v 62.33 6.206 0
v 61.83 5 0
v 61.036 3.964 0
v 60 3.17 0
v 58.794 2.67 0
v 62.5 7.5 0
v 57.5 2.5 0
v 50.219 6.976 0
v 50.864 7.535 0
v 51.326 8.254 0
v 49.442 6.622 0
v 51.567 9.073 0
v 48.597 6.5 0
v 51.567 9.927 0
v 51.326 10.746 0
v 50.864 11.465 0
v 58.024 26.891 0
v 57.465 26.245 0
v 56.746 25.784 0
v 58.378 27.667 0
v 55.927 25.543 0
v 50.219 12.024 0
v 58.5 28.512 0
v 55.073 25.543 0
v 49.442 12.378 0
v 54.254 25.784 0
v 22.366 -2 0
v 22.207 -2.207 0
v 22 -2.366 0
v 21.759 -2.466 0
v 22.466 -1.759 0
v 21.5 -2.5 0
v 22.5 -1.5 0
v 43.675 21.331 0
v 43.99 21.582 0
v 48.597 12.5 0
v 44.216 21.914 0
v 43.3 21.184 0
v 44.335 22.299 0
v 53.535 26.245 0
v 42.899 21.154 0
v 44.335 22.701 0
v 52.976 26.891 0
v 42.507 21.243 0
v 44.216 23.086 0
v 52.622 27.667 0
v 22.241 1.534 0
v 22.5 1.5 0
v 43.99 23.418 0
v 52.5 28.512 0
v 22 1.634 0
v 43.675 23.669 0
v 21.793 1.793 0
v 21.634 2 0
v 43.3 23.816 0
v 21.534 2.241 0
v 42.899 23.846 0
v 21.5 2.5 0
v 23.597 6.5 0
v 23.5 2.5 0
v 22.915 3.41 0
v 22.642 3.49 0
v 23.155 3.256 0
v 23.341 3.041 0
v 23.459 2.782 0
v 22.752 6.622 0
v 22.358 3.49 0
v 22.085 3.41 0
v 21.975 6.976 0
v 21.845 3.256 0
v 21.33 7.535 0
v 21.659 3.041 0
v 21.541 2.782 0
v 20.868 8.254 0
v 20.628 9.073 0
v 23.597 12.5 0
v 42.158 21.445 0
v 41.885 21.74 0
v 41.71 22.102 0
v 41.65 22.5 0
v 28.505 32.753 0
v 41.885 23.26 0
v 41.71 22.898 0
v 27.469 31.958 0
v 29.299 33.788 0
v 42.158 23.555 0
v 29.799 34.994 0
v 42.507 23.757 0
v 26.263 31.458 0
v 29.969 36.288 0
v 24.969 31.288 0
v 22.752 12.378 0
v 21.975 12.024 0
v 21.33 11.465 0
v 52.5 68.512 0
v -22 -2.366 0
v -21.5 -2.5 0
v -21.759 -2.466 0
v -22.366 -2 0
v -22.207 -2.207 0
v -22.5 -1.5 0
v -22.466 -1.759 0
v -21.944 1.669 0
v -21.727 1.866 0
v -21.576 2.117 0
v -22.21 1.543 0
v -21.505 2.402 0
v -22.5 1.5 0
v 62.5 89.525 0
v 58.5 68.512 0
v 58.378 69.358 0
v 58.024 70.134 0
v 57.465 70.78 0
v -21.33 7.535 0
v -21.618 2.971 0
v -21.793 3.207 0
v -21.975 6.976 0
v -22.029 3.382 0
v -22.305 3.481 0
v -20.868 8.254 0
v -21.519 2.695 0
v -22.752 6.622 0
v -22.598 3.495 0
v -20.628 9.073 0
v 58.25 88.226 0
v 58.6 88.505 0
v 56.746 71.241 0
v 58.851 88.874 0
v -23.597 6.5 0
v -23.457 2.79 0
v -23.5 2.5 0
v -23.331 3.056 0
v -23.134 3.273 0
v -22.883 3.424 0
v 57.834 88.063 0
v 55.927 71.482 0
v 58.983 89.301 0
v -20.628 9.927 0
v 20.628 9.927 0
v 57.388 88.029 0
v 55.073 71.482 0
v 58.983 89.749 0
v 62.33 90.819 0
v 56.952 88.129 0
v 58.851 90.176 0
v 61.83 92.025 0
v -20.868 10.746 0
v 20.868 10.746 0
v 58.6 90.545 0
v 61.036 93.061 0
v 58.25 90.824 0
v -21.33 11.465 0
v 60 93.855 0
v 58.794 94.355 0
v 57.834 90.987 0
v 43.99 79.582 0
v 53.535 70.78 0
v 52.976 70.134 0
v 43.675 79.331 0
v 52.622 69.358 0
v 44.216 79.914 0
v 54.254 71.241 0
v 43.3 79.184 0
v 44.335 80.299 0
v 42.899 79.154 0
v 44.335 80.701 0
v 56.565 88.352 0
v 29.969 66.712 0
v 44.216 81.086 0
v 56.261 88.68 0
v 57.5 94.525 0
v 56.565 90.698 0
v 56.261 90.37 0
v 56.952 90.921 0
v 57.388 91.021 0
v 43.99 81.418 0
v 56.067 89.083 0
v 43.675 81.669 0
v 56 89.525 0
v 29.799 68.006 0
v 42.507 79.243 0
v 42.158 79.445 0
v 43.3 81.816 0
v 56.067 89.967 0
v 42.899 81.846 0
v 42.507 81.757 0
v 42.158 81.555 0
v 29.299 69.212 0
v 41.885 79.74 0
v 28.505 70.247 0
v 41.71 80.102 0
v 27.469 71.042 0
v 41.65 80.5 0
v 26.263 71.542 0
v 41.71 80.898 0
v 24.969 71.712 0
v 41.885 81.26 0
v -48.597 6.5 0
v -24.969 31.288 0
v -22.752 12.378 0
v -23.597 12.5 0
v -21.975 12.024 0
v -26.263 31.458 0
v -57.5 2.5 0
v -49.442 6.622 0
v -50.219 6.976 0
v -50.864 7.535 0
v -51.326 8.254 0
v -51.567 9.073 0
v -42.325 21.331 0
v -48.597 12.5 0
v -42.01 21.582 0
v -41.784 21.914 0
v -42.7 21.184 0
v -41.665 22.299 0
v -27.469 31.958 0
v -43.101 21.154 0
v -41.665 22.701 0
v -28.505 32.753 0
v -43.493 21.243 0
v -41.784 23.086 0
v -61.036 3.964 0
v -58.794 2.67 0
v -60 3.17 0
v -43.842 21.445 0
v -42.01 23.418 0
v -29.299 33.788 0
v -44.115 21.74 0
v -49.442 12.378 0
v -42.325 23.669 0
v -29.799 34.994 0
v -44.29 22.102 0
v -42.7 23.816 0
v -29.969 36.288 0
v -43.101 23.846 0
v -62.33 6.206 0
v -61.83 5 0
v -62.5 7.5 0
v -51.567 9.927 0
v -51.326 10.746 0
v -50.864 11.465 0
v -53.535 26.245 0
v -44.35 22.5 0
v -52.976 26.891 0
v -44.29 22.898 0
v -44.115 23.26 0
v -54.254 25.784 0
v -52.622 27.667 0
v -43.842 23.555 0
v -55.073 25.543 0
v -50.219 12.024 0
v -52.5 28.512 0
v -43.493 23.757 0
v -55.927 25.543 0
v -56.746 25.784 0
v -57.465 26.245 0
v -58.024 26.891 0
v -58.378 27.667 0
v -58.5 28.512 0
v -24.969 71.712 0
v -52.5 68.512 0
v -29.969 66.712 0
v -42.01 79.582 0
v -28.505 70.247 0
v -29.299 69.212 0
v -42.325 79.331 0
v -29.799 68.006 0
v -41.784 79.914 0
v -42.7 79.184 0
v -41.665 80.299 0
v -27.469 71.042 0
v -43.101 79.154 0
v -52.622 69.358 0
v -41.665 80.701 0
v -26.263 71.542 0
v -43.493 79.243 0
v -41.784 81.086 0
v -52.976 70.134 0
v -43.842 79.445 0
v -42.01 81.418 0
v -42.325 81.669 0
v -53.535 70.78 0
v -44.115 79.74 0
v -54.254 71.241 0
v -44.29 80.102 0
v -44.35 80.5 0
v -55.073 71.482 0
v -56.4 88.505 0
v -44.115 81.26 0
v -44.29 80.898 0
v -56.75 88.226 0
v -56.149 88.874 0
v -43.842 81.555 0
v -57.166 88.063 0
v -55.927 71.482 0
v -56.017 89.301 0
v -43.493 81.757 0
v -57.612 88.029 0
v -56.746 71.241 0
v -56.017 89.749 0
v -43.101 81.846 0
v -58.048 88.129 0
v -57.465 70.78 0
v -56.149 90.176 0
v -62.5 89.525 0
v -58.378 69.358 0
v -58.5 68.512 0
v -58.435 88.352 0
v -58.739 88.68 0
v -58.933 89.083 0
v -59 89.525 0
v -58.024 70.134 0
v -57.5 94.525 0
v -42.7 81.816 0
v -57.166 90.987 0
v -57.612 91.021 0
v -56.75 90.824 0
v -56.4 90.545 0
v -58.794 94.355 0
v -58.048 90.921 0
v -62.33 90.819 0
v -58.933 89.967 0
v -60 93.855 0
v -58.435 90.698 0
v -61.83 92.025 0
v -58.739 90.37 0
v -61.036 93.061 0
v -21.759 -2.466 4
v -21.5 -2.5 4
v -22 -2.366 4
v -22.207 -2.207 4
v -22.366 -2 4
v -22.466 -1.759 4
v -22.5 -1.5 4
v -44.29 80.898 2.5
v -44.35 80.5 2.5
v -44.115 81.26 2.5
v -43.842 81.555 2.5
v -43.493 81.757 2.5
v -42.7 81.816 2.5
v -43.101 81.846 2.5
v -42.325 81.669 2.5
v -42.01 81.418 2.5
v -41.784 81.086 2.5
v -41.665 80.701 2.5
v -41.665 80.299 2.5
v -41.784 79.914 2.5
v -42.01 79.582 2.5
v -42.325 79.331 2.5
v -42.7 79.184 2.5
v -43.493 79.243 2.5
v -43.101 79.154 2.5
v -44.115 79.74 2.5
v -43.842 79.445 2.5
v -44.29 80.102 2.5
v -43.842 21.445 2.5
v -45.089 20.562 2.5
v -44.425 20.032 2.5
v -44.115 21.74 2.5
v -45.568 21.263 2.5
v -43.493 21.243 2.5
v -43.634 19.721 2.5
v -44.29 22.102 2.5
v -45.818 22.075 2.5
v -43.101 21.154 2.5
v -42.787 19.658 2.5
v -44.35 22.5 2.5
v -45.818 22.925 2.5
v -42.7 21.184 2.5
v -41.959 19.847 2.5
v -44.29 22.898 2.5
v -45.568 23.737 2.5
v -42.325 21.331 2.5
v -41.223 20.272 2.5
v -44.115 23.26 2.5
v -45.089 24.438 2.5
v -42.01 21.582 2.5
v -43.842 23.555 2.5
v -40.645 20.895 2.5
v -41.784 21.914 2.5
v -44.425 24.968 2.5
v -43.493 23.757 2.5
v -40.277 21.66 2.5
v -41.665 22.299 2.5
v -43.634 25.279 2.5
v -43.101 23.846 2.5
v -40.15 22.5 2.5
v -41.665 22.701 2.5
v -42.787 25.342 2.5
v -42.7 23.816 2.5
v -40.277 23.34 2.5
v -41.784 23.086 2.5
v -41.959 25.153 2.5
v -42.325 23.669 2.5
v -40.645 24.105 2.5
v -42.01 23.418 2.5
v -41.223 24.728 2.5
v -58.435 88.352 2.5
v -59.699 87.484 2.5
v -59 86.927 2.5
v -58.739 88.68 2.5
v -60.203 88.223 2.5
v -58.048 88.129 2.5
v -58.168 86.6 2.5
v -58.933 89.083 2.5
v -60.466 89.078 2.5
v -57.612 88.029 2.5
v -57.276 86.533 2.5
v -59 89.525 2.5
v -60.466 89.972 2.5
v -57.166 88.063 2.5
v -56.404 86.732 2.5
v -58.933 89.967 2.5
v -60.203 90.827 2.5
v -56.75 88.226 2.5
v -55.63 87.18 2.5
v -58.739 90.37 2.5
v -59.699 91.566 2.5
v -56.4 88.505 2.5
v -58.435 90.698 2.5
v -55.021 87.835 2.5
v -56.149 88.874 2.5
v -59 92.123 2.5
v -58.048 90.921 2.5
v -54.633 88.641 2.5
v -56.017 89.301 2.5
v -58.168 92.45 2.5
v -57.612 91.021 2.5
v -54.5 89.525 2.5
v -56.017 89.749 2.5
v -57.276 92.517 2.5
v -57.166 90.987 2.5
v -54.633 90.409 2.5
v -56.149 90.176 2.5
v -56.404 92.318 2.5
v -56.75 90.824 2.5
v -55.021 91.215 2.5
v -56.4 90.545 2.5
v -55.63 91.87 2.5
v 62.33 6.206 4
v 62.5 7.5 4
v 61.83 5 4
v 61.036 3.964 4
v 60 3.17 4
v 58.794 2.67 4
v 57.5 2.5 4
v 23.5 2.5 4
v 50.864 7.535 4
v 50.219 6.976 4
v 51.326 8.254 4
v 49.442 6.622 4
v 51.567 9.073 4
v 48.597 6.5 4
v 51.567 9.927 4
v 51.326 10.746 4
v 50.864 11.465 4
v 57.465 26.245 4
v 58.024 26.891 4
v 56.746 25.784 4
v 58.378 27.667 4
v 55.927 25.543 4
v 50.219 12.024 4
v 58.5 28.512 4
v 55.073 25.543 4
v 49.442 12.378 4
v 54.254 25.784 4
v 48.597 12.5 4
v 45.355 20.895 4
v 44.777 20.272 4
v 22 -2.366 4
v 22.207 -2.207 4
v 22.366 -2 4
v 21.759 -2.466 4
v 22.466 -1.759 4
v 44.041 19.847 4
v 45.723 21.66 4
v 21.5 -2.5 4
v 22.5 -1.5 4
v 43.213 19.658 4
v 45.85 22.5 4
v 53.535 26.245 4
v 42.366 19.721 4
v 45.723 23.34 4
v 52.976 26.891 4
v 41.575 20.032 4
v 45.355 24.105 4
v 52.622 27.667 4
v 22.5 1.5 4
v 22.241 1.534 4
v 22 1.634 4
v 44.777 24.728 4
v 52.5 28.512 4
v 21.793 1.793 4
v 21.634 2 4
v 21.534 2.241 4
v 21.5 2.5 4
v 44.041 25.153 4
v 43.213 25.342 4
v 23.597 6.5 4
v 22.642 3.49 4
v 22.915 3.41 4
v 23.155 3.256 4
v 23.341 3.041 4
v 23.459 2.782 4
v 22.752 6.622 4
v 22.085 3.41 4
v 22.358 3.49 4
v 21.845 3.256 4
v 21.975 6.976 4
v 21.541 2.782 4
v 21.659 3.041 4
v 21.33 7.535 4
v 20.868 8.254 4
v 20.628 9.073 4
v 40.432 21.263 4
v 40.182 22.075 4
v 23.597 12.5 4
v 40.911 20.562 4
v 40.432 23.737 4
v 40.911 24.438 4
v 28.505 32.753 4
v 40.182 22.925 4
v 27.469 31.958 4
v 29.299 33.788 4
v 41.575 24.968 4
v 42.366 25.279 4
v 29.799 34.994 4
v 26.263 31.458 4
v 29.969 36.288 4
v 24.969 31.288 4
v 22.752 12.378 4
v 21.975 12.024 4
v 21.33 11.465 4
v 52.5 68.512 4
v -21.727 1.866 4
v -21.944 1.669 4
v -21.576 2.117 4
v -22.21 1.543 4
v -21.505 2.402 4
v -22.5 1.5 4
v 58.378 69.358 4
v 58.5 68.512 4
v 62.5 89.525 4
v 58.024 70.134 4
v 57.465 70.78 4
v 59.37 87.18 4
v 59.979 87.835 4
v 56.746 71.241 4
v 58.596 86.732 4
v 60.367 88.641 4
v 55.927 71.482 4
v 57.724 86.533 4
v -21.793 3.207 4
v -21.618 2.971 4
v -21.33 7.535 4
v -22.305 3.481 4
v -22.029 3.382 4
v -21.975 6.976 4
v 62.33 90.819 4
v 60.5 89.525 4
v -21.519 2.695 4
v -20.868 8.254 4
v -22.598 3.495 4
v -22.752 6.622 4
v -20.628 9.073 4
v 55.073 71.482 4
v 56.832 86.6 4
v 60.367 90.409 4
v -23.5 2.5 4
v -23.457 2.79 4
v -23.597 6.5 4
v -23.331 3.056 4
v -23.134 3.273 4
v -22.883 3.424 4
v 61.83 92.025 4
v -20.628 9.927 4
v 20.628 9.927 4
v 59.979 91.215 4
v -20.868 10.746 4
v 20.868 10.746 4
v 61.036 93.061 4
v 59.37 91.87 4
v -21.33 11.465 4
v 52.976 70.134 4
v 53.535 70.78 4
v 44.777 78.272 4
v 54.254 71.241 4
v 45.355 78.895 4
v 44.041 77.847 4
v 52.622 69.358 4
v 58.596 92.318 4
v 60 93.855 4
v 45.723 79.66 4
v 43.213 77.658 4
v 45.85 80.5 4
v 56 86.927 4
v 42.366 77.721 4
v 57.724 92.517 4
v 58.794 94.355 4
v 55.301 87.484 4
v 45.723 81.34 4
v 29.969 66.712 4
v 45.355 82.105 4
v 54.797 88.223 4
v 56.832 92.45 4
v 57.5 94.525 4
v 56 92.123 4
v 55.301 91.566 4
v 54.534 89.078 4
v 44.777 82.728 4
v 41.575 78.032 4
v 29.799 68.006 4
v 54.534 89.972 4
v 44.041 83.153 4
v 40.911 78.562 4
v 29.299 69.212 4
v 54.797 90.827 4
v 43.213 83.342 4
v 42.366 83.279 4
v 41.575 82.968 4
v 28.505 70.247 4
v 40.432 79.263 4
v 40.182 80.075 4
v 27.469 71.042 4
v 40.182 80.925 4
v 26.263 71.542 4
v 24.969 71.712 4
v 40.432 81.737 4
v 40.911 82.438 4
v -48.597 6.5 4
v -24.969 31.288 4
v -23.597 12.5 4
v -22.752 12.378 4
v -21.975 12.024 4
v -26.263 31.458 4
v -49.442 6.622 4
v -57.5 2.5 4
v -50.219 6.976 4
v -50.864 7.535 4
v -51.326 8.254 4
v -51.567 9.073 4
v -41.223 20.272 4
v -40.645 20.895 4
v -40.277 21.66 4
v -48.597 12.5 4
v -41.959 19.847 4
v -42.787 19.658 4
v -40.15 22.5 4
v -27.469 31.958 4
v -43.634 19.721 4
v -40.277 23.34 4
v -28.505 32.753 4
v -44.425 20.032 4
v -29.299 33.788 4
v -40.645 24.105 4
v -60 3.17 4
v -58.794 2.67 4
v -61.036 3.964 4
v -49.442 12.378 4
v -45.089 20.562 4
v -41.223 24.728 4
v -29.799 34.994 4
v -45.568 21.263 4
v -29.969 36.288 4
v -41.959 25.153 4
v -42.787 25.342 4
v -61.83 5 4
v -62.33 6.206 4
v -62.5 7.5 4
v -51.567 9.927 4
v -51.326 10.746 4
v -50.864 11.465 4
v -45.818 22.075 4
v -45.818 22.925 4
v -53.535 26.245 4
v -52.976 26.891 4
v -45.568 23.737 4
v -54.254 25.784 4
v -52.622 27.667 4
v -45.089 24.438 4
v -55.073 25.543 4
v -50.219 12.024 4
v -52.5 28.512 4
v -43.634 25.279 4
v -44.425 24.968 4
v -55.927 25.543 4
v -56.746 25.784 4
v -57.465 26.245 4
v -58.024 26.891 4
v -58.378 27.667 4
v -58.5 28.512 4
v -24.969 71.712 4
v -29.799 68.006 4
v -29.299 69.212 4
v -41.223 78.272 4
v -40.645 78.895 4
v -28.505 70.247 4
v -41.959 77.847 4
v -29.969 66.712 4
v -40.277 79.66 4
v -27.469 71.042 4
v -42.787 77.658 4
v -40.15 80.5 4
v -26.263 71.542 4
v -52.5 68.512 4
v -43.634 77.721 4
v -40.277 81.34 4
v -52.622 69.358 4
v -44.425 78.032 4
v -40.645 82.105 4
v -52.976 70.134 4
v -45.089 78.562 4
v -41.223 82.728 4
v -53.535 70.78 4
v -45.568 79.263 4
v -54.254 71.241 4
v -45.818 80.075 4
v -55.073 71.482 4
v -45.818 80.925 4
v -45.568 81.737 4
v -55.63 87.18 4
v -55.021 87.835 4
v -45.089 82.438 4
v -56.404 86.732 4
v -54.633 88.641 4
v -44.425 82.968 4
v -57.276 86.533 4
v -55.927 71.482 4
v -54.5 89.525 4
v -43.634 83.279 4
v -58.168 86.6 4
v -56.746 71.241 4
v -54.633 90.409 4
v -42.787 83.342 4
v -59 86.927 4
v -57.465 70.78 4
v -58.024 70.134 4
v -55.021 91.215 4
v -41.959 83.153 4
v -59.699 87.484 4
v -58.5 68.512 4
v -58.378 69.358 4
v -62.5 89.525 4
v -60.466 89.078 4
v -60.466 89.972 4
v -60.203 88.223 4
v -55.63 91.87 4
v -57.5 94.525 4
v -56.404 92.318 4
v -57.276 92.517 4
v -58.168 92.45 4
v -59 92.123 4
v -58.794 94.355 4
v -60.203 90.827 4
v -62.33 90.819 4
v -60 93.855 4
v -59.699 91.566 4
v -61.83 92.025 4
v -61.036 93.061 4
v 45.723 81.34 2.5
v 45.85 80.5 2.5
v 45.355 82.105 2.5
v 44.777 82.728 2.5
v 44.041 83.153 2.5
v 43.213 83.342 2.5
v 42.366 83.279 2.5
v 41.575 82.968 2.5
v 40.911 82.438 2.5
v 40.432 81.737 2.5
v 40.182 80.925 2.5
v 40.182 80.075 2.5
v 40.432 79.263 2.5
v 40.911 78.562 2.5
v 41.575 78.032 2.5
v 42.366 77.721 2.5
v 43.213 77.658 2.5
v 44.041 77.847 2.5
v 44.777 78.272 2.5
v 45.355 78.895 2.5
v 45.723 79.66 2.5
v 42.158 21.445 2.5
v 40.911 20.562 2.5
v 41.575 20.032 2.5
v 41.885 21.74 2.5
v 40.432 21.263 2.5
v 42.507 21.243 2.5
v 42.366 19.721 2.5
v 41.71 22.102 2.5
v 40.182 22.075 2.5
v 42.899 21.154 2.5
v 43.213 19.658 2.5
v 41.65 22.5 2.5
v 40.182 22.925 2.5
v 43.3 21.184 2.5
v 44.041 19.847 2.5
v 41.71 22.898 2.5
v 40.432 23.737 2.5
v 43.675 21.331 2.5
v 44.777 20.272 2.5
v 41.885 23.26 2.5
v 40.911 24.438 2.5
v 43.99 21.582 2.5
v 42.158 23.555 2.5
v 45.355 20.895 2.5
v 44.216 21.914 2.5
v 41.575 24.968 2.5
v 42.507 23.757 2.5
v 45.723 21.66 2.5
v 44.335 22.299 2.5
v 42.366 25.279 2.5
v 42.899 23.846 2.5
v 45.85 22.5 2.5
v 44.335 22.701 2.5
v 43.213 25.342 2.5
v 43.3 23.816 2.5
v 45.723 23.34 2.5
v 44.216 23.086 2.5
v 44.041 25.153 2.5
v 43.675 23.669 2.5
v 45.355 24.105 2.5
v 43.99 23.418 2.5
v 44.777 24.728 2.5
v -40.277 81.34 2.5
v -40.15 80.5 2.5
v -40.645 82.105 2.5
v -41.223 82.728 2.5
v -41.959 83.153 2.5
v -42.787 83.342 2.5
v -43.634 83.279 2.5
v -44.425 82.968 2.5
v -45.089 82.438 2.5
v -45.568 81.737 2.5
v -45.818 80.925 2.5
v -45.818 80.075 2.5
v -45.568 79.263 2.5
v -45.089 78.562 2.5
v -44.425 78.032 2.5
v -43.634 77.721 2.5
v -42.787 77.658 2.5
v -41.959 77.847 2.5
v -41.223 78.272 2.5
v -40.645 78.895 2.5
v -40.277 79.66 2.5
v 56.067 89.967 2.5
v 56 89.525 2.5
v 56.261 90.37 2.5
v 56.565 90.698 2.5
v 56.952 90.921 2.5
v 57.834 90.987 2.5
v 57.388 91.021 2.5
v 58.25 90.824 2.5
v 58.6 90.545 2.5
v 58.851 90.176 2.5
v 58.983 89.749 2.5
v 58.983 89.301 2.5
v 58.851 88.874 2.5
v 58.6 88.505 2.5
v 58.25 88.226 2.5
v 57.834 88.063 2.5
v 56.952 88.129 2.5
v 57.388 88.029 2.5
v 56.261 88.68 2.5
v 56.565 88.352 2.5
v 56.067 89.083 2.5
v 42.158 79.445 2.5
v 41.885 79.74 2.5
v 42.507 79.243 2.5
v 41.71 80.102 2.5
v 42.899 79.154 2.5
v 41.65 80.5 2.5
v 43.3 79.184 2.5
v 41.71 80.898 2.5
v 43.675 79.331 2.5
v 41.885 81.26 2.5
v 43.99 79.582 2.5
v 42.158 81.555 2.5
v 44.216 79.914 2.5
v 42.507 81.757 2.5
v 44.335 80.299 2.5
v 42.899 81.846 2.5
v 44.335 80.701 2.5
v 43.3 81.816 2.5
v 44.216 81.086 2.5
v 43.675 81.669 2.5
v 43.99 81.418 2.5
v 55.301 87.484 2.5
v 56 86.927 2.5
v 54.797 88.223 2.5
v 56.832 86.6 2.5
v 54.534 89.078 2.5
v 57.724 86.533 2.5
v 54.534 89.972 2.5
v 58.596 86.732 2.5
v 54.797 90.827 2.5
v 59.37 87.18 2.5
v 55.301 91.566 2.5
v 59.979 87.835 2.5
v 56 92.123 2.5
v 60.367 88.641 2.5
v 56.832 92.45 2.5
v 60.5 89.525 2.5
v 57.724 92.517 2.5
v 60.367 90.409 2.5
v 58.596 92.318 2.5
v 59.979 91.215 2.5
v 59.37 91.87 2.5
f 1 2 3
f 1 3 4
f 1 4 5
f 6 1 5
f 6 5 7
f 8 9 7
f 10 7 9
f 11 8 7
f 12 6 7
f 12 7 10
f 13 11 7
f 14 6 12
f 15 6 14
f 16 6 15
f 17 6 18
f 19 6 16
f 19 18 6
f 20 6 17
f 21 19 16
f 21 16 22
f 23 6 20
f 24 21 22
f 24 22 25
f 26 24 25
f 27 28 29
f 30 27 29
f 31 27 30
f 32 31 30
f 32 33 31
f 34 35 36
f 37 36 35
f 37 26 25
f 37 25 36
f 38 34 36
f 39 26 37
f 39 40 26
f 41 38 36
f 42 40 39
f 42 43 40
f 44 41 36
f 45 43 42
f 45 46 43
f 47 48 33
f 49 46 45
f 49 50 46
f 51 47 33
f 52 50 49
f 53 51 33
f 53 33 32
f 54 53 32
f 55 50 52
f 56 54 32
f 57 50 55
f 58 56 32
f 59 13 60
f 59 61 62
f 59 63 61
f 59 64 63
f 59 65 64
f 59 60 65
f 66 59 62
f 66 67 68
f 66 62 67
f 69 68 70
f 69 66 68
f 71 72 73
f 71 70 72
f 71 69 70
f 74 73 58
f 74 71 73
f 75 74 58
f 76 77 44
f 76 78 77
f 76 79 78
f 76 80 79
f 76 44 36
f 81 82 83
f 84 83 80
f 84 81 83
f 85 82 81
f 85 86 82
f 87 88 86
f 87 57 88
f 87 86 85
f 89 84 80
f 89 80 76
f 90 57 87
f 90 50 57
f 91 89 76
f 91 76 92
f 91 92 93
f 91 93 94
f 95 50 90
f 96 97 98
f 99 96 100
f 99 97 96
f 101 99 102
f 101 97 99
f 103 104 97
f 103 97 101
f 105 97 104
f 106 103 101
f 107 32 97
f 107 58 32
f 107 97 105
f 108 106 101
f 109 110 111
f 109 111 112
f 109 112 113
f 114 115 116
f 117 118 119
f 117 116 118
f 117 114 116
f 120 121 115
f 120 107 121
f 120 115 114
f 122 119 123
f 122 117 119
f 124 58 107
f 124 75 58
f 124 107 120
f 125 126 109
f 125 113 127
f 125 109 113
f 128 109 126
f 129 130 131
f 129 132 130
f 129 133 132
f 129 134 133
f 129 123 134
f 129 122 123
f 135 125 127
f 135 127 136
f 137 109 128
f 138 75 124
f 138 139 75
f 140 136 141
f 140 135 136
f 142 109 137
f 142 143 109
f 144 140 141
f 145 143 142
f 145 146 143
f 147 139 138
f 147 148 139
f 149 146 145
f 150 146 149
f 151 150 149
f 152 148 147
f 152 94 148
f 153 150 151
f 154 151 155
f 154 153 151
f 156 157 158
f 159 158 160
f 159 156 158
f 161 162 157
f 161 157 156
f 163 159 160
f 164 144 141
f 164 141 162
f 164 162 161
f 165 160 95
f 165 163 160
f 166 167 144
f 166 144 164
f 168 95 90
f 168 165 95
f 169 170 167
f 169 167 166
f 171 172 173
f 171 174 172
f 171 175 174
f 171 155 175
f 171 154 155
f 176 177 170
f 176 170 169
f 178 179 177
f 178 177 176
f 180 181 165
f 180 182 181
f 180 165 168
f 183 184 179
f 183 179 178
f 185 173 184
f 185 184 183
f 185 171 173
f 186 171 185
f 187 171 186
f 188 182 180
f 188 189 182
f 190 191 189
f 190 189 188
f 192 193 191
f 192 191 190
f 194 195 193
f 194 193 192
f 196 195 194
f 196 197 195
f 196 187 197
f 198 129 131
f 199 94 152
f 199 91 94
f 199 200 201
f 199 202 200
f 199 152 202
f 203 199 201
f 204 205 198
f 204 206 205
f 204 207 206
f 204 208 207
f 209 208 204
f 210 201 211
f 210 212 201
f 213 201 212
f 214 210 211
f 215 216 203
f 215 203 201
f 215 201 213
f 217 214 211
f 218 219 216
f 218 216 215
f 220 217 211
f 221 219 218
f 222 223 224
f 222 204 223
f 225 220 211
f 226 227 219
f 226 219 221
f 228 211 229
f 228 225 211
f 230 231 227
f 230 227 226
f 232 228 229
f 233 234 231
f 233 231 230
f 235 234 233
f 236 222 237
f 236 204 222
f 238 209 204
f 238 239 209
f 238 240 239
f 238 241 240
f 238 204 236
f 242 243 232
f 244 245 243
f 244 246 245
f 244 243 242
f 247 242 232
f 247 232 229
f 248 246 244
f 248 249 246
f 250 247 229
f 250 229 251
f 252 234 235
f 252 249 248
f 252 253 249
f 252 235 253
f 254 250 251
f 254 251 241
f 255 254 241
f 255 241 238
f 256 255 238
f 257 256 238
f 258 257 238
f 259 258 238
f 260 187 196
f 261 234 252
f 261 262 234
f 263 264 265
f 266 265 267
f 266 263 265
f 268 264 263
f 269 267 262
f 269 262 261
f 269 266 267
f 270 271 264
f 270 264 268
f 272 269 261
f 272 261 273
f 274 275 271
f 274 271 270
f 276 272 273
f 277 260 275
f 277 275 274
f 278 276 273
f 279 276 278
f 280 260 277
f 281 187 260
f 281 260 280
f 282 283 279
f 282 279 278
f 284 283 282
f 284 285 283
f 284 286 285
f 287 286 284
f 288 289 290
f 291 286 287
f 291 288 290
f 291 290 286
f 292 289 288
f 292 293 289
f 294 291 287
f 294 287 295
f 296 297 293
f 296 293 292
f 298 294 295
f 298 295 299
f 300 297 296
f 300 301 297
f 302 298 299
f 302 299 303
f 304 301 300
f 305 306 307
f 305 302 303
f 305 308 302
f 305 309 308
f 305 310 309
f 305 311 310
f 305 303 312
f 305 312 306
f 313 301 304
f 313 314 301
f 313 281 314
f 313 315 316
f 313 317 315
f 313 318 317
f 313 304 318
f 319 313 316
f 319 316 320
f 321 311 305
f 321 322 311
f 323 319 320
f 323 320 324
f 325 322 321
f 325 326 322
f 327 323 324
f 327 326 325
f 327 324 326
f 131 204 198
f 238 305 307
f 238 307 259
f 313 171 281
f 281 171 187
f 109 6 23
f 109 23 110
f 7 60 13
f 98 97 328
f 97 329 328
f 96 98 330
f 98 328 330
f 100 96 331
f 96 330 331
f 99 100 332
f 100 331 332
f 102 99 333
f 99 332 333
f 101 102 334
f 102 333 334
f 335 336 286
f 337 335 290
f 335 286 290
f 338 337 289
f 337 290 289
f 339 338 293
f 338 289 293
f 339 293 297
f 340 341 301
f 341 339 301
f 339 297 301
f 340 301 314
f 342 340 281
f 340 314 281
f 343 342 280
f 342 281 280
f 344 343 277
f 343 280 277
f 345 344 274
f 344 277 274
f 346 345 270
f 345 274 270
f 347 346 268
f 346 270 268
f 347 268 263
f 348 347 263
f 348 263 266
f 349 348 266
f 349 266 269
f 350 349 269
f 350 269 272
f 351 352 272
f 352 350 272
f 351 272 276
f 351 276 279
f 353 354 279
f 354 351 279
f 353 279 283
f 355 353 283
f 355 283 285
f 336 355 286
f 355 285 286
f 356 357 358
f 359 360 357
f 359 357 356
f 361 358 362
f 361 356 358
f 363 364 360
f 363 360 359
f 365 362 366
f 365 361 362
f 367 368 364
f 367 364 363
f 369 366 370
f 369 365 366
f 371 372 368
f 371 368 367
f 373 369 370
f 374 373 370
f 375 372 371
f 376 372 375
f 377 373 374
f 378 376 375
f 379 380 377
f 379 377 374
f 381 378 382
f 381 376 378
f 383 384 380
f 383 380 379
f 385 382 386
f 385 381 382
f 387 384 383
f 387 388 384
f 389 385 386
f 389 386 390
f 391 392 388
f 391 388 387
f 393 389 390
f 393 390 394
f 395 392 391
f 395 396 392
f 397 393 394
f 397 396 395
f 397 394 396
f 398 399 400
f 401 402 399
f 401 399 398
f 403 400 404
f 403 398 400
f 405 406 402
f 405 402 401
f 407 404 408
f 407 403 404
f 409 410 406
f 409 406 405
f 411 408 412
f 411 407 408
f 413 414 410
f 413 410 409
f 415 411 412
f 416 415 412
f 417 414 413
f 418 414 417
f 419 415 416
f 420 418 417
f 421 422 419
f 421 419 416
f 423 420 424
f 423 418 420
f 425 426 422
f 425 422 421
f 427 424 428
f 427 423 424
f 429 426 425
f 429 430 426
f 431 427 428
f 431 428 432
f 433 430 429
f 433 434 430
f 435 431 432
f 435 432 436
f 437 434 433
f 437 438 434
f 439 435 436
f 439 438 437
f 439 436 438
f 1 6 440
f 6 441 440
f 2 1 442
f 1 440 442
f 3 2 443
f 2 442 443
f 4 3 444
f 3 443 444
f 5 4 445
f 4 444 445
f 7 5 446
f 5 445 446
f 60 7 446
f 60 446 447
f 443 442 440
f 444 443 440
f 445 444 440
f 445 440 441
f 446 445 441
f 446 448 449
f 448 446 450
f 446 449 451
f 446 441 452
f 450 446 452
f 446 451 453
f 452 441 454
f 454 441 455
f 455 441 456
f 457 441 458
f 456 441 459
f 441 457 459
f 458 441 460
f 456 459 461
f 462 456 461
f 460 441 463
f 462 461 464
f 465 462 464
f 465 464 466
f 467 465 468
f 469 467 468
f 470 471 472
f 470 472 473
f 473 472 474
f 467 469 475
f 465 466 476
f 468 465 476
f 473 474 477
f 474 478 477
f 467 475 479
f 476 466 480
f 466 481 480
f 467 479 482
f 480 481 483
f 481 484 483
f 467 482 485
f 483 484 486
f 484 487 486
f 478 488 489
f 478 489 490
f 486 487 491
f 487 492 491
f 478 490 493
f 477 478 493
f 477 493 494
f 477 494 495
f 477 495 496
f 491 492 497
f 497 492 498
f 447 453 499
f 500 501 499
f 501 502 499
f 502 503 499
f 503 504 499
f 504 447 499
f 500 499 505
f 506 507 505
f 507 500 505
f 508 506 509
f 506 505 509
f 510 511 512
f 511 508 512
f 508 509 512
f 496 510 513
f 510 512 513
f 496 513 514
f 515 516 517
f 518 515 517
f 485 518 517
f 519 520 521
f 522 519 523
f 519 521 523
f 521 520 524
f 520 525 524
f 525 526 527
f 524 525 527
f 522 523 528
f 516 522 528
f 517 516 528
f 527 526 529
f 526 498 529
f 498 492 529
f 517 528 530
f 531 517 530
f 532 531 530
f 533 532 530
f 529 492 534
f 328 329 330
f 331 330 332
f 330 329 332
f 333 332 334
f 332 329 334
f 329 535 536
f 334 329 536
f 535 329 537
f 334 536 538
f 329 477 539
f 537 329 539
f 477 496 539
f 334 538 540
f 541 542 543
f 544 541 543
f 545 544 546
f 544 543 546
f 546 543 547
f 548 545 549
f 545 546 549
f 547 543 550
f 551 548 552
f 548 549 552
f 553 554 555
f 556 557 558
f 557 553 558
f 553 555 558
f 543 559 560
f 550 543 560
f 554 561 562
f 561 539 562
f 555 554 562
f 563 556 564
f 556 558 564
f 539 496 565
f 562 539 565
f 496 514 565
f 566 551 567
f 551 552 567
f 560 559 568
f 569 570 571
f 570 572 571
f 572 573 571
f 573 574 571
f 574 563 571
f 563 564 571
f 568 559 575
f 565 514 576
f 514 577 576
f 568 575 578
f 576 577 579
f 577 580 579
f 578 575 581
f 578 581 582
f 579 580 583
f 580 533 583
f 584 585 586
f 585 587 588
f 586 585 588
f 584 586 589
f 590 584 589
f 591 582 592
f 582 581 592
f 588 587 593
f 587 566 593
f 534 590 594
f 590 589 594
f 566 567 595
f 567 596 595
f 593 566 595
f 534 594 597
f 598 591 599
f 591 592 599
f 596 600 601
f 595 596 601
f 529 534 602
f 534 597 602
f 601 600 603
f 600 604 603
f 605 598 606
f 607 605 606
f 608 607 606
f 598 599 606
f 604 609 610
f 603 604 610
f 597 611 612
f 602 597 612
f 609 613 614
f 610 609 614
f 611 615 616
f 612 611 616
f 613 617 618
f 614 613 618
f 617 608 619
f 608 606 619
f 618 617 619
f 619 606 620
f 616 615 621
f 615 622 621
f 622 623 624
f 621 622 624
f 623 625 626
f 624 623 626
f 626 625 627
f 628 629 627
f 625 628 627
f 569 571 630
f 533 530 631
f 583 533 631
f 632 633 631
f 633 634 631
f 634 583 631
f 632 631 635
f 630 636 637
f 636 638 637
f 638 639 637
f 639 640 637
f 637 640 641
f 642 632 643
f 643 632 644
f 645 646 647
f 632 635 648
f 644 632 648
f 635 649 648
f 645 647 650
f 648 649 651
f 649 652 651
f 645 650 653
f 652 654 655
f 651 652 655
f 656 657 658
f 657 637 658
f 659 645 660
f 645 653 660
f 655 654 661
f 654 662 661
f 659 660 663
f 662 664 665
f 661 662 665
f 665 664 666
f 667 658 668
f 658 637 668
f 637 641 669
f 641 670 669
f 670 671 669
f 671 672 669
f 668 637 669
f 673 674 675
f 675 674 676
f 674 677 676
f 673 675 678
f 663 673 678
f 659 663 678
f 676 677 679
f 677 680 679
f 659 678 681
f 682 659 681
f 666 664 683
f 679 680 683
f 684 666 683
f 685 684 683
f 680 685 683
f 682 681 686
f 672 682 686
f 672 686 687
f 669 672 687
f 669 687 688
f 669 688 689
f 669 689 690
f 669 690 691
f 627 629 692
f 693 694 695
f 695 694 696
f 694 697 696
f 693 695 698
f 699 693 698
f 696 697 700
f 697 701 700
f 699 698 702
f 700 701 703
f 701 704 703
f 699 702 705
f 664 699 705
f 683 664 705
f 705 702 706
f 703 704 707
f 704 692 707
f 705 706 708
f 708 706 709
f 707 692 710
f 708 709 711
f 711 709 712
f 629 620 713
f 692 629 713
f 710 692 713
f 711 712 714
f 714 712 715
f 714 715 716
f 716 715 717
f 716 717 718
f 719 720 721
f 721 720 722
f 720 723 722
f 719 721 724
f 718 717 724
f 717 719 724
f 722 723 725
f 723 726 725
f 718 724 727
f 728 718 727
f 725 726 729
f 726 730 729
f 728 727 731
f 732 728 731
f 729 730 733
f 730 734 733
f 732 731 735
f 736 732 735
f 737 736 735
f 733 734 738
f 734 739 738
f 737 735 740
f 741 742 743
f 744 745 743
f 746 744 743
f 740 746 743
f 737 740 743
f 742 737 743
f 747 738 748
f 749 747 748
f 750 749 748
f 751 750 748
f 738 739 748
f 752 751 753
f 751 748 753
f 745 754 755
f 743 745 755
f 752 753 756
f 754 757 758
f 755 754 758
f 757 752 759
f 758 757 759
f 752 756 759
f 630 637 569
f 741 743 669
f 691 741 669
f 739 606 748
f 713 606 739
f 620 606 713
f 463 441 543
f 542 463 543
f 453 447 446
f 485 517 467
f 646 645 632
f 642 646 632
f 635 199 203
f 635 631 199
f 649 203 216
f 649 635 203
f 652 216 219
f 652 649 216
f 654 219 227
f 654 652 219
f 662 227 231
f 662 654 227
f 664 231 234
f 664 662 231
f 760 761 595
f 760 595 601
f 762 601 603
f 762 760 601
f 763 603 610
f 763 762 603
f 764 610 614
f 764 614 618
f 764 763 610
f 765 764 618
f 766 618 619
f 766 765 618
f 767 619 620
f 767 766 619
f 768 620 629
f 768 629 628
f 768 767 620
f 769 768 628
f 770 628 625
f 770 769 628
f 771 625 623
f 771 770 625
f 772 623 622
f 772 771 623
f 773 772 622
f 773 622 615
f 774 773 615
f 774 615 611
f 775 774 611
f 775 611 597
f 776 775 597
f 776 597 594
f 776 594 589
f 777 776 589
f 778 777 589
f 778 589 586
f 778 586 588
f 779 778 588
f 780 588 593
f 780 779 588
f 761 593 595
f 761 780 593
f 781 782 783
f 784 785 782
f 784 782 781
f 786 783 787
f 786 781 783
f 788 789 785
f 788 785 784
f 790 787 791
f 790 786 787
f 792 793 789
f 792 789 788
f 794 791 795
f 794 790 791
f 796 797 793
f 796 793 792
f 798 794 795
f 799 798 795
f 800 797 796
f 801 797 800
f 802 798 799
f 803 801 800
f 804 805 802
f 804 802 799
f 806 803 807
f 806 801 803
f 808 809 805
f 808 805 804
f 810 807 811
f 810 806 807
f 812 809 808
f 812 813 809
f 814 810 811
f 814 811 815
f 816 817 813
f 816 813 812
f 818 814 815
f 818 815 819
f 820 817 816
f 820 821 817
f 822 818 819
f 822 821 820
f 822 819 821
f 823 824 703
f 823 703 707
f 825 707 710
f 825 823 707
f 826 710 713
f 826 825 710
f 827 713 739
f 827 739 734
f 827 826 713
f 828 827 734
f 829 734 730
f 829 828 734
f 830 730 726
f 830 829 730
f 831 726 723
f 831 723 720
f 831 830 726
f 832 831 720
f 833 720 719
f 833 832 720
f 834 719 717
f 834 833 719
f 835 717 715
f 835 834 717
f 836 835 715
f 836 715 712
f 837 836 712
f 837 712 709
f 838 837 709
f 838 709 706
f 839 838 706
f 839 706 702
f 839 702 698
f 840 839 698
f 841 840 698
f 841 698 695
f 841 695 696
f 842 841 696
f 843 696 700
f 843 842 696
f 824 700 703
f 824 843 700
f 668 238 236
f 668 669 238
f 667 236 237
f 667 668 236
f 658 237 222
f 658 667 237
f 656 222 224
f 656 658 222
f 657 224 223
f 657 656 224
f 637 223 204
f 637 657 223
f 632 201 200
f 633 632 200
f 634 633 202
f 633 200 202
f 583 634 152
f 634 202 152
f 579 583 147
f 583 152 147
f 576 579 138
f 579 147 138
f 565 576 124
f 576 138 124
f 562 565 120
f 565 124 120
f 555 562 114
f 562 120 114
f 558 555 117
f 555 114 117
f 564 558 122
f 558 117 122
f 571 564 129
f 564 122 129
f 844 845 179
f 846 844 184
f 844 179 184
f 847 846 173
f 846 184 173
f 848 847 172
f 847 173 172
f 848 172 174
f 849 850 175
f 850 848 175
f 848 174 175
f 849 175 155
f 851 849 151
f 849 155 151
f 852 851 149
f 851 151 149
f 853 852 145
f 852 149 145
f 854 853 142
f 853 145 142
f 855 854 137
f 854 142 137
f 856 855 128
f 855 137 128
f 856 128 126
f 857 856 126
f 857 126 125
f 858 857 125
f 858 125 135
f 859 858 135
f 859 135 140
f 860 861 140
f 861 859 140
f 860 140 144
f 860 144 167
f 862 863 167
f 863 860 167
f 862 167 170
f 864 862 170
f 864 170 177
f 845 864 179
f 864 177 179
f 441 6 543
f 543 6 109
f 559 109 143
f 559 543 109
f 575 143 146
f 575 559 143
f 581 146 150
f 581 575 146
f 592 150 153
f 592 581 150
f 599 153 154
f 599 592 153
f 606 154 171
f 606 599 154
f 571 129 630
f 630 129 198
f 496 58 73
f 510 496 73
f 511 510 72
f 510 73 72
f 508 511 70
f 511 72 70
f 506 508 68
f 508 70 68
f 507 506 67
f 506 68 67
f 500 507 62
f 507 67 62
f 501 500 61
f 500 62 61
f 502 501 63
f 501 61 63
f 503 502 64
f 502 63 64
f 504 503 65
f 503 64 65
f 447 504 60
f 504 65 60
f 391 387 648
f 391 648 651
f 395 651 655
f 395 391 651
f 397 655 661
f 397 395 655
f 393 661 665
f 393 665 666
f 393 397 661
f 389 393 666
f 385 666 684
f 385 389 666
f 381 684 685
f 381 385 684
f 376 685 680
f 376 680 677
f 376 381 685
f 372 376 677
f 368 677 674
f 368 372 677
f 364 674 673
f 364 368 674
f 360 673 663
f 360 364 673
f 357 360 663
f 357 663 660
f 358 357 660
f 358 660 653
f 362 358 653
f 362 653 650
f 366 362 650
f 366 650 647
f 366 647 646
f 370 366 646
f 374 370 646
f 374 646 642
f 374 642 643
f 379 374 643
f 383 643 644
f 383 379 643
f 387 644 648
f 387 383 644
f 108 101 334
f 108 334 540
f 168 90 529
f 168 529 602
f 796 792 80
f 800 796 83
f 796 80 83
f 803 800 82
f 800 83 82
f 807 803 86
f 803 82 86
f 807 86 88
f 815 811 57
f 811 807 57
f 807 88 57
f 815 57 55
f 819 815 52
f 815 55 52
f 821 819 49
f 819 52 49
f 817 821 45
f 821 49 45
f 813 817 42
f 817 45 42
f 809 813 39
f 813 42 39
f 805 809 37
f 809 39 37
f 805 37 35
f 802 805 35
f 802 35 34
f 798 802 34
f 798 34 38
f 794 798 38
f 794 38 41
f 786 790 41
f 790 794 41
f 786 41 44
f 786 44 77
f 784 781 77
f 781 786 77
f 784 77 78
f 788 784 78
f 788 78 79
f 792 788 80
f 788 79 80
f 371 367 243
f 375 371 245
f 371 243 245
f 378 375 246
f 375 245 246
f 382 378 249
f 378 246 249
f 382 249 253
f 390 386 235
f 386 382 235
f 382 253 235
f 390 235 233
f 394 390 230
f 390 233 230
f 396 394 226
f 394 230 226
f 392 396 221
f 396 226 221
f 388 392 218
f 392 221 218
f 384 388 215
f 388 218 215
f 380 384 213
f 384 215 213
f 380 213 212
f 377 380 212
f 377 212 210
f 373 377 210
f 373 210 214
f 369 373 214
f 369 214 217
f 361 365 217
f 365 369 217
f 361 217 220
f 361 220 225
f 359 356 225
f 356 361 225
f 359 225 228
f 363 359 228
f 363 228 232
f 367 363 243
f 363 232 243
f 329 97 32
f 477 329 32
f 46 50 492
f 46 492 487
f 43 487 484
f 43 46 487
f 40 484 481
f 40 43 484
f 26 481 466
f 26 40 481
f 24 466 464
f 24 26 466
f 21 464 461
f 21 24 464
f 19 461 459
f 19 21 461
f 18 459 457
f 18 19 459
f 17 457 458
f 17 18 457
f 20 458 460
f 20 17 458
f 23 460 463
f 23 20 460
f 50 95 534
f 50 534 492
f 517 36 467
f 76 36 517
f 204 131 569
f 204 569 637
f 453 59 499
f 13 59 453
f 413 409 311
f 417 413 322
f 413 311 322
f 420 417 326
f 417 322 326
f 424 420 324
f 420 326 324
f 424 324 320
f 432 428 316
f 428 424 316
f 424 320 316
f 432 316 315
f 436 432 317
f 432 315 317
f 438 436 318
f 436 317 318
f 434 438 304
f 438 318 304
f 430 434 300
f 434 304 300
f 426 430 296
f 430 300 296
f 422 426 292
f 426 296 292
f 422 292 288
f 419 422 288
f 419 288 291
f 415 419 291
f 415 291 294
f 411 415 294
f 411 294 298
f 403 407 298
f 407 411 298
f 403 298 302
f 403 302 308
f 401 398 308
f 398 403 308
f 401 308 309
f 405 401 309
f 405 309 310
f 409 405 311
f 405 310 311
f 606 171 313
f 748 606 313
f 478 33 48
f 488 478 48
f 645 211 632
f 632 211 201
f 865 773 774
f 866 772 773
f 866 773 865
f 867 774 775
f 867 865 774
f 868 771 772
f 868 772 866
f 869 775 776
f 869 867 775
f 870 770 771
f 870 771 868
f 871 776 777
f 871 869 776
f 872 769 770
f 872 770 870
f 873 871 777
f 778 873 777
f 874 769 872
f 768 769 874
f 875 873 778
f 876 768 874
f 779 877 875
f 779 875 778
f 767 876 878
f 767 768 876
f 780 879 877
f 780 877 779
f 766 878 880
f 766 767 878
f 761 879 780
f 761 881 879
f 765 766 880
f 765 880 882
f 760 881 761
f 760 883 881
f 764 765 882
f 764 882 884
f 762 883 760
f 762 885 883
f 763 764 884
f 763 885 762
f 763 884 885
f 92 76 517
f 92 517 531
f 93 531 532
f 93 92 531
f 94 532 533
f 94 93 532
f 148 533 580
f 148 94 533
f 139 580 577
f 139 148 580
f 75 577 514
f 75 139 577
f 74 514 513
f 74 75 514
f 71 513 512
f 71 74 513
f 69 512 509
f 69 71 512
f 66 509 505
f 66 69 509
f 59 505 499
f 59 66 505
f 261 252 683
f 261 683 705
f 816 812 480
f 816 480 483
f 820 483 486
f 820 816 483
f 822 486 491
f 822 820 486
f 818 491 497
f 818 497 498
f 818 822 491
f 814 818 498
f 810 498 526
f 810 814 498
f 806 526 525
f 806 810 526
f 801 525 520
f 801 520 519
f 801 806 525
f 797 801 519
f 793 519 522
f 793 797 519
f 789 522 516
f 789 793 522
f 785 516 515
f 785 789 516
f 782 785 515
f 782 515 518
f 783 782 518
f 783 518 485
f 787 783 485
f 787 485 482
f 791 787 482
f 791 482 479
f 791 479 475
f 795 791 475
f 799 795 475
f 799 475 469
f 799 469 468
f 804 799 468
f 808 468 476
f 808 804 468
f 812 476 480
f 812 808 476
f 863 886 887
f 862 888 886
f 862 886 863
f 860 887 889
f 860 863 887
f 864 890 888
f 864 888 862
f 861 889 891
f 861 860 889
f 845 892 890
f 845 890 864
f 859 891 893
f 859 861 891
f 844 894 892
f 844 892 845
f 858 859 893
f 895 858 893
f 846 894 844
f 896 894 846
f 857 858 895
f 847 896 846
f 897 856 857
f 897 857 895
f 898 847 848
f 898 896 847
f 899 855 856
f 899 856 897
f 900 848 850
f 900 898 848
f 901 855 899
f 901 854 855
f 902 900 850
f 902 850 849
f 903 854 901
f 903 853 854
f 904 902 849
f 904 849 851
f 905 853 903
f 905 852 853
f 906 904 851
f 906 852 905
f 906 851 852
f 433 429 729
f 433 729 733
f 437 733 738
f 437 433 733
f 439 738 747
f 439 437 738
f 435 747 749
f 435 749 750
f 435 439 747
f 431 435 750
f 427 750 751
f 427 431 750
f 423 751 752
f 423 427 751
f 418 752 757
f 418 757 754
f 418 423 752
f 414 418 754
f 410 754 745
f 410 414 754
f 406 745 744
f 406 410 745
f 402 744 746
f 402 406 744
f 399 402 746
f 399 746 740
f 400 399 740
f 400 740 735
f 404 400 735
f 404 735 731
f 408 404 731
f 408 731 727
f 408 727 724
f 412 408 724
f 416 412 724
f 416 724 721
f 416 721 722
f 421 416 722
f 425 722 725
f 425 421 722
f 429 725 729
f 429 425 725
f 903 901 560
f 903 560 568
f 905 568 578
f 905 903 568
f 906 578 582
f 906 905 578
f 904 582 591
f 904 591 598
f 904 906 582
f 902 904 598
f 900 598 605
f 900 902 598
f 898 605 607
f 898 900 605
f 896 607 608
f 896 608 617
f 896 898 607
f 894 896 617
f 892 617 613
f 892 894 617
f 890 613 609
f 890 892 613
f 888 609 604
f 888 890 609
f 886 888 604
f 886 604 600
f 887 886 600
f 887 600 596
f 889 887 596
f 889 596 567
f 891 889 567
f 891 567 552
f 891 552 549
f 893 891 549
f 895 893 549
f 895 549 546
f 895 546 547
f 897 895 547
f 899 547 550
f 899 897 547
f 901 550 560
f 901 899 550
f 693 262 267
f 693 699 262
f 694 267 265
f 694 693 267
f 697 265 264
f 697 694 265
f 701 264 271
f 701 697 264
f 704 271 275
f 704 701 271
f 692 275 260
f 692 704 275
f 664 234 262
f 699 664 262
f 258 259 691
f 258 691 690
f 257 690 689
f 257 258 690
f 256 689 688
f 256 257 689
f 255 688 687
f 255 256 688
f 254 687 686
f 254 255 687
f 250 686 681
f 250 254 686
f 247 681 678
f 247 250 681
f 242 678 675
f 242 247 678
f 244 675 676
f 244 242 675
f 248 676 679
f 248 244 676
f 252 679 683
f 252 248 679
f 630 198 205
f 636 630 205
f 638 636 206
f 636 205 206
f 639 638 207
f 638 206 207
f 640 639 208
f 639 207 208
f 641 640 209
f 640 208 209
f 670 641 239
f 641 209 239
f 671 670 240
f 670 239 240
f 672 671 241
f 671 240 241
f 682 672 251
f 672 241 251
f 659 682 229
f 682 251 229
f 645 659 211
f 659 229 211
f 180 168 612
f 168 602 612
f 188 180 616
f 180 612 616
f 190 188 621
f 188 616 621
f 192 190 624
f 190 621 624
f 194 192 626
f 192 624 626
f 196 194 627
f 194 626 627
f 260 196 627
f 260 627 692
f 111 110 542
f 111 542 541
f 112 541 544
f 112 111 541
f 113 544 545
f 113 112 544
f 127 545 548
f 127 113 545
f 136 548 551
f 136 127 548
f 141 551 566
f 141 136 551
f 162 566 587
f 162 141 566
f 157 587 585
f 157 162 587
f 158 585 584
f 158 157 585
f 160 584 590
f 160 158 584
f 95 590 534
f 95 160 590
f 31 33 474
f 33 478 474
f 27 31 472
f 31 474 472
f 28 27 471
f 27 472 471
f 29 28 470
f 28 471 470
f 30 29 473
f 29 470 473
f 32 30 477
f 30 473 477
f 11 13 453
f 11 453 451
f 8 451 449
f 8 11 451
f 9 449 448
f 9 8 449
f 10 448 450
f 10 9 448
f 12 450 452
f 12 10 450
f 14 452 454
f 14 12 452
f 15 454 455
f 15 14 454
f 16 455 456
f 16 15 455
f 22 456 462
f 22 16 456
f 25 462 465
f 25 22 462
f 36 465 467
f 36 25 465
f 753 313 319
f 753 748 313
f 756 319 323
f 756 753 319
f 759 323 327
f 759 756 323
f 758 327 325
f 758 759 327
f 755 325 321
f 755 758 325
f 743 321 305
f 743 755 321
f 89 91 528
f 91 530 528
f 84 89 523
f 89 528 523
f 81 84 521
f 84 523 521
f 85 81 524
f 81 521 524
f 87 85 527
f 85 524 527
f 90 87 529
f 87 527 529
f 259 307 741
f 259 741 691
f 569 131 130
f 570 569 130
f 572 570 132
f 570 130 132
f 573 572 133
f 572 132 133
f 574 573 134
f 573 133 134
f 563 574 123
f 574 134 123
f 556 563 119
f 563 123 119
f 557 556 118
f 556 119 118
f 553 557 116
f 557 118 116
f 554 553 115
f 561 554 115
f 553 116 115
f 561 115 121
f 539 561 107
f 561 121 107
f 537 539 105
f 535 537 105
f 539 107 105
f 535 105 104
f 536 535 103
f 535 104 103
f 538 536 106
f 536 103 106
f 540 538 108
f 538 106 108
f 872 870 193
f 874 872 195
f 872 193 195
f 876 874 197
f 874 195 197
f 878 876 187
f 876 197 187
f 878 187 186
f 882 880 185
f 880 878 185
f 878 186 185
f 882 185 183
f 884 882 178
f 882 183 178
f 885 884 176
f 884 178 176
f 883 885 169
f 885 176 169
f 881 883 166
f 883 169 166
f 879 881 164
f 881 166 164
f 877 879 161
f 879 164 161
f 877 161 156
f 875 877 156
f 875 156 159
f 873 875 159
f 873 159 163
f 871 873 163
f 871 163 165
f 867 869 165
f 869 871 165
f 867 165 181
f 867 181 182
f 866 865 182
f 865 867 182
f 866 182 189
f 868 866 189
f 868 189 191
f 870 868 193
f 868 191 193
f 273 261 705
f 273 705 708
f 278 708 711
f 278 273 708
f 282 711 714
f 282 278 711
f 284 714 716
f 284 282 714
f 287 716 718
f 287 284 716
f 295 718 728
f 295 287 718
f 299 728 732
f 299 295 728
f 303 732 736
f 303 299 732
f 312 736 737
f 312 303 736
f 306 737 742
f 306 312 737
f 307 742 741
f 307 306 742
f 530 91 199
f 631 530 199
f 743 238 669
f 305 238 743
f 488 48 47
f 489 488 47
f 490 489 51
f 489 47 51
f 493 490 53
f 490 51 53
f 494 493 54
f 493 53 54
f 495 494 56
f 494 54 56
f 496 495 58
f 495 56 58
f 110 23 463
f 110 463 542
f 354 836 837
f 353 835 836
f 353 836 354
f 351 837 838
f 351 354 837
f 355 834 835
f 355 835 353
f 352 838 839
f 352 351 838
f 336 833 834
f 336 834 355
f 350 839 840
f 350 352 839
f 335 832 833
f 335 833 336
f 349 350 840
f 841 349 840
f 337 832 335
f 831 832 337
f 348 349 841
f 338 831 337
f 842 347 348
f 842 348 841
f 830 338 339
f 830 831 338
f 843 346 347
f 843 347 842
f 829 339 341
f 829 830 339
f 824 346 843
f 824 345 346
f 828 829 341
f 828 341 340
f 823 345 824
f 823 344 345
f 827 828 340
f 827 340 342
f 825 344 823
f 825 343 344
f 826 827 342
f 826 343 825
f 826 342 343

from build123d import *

# Parameters (mm, degrees)
SKETCH_1_W          = 45
SKETCH_1_H          = 5
EXTRUDE_1_DEPTH     = 4
SKETCH_2_W          = 125
SKETCH_2_H          = 92.025
SKETCH_2_R          = 1.5
SKETCH_2_R_2        = 1.35
SKETCH_2_W_2        = 59.93870536
SKETCH_2_H_2        = 40.423778034
SKETCH_2_W_3        = 45
SKETCH_2_H_3        = 5
EXTRUDE_2_DEPTH     = 4
CUT_EXTRUDE_1_DEPTH = 4
FILLET_1_R          = 5
FILLET_2_R          = 1
CUT_EXTRUDE_START   = -1.5
SKETCH_4_R          = 2.85
SKETCH_4_R_2        = 1.35
SKETCH_4_R_3        = 3
SKETCH_4_R_4        = 1.5
CUT_EXTRUDE_2_DEPTH = 1.5


with BuildPart() as part:
    # 草图1 → 凸台-拉伸1 (new body)
    with BuildSketch(Plane.XY):
        Rectangle(SKETCH_1_W, SKETCH_1_H)
    extrude(amount=EXTRUDE_1_DEPTH)

    # 草图2 → 凸台-拉伸2 (add)
    # profile 1 of 2: a face of its own
    with BuildSketch(Plane(origin=(0, 0, 0), x_dir=(-1, 0, 0), z_dir=(0, 0, -1))):
        with Locations((0, 48.5125)):
            Rectangle(SKETCH_2_W, SKETCH_2_H)
        with Locations((-57.5, 89.525)):
            Circle(SKETCH_2_R, mode=Mode.SUBTRACT)
        with Locations((57.5, 89.525)):
            Circle(SKETCH_2_R, mode=Mode.SUBTRACT)
        with Locations((-43, 80.5)):
            Circle(SKETCH_2_R_2, mode=Mode.SUBTRACT)
        with Locations((43, 80.5)):
            Circle(SKETCH_2_R_2, mode=Mode.SUBTRACT)
        with Locations((43, 22.5)):
            Circle(SKETCH_2_R_2, mode=Mode.SUBTRACT)
        with Locations((-43, 22.5)):
            Circle(SKETCH_2_R_2, mode=Mode.SUBTRACT)
        with BuildLine():
            Line((-52.5, 68.5125), (-52.5, 28.5125))
            ThreePointArc((-52.5, 28.5125), (-55.5, 25.5125), (-58.5, 28.5125))
            Line((-58.5, 28.5125), (-58.5, 68.5125))
            ThreePointArc((-58.5, 68.5125), (-55.5, 71.5125), (-52.5, 68.5125))
        make_face(mode=Mode.SUBTRACT)
        with BuildLine():
            Line((58.5, 68.5125), (58.5, 28.5125))
            ThreePointArc((58.5, 28.5125), (55.5, 25.5125), (52.5, 28.5125))
            Line((52.5, 28.5125), (52.5, 68.5125))
            ThreePointArc((52.5, 68.5125), (55.5, 71.5125), (58.5, 68.5125))
        make_face(mode=Mode.SUBTRACT)
        with Locations((0, 51.5)):
            Rectangle(SKETCH_2_W_2, SKETCH_2_H_2, mode=Mode.SUBTRACT)
        with BuildLine():
            Line((-48.597194221, 12.5), (-23.597194221, 12.5))
            ThreePointArc((-23.597194221, 12.5), (-20.597194221, 9.5), (-23.597194221, 6.5))
            Line((-23.597194221, 6.5), (-48.597194221, 6.5))
            ThreePointArc((-48.597194221, 6.5), (-51.597194221, 9.5), (-48.597194221, 12.5))
        make_face(mode=Mode.SUBTRACT)
        with BuildLine():
            Line((48.597194221, 12.5), (23.597194221, 12.5))
            ThreePointArc((23.597194221, 12.5), (20.597194221, 9.5), (23.597194221, 6.5))
            Line((23.597194221, 6.5), (48.597194221, 6.5))
            ThreePointArc((48.597194221, 6.5), (51.597194221, 9.5), (48.597194221, 12.5))
        make_face(mode=Mode.SUBTRACT)
    # profile 2 of 2: a face of its own
    with BuildSketch(Plane(origin=(0, 0, 0), x_dir=(-1, 0, 0), z_dir=(0, 0, -1))):
        Rectangle(SKETCH_2_W_3, SKETCH_2_H_3)
    extrude(amount=-EXTRUDE_2_DEPTH)

    # 草图3 → 切除-拉伸1 (cut)
    with BuildSketch(Plane(origin=(0, 0, 0), x_dir=(-1, 0, 0), z_dir=(0, 0, -1))):
        with BuildLine():
            Line((-23.5, 2.5), (-22.5, 2.5))
            Line((-22.5, 2.5), (-22.5, 1.5))
            ThreePointArc((-22.5, 1.5), (-21.792893219, 1.792893219), (-21.5, 2.5))
            ThreePointArc((-21.5, 2.5), (-22.5, 3.5), (-23.5, 2.5))
        make_face()
        with BuildLine():
            Line((-22.5, 1.5), (-22.5, 2.5))
            Line((-22.5, 2.5), (-23.5, 2.5))
            ThreePointArc((-23.5, 2.5), (-23.207106781, 1.792893219), (-22.5, 1.5))
        make_face()
        with BuildLine():
            ThreePointArc((23.5, 2.5), (21.792893219, 3.207106781), (22.5, 1.5))
            Line((22.5, 1.5), (22.5, 2.5))
            Line((22.5, 2.5), (23.5, 2.5))
        make_face()
        with BuildLine():
            Line((22.5, 2.5), (22.5, 1.5))
            ThreePointArc((22.5, 1.5), (23.207106781, 1.792893219), (23.5, 2.5))
            Line((23.5, 2.5), (22.5, 2.5))
        make_face()
    extrude(amount=-CUT_EXTRUDE_1_DEPTH, mode=Mode.SUBTRACT)

    # 圆角1
    fillet_1_edges = [part.edges().sort_by_distance(p)[0] for p in [
        (-62.5, 2.5, 2),
        (-29.96935268, 71.711889017, 2),
        (29.96935268, 71.711889017, 2),
        (29.96935268, 31.288110983, 2),
        (62.5, 94.525, 2),
        (-62.5, 94.525, 2),
        (-29.96935268, 31.288110983, 2),
        (62.5, 2.5, 2),
    ]]
    fillet(fillet_1_edges, radius=FILLET_1_R)

    # 圆角2
    fillet_2_edges = [part.edges().sort_by_distance(p)[0] for p in [
        (22.5, -2.5, 2),
        (-22.5, -2.5, 2),
    ]]
    fillet(fillet_2_edges, radius=FILLET_2_R)

    # 草图4 → 切除-拉伸2 (cut)
    # profile 1 of 6: a face of its own
    with BuildSketch(Plane.XY.offset(4).offset(CUT_EXTRUDE_START)):
        with Locations((43, 22.5)):
            Circle(SKETCH_4_R)
        with Locations(Location((43, 22.5, 0), (0, 0, 180))):
            Circle(SKETCH_4_R_2, mode=Mode.SUBTRACT)
    # profile 2 of 6: a face of its own
    with BuildSketch(Plane.XY.offset(4).offset(CUT_EXTRUDE_START)):
        with Locations((43, 80.5)):
            Circle(SKETCH_4_R)
        with Locations(Location((43, 80.5, 0), (0, 0, 180))):
            Circle(SKETCH_4_R_2, mode=Mode.SUBTRACT)
    # profile 3 of 6: a face of its own
    with BuildSketch(Plane.XY.offset(4).offset(CUT_EXTRUDE_START)):
        with Locations((-43, 22.5)):
            Circle(SKETCH_4_R)
        with Locations(Location((-43, 22.5, 0), (0, 0, 180))):
            Circle(SKETCH_4_R_2, mode=Mode.SUBTRACT)
    # profile 4 of 6: a face of its own
    with BuildSketch(Plane.XY.offset(4).offset(CUT_EXTRUDE_START)):
        with Locations((-43, 80.5)):
            Circle(SKETCH_4_R)
        with Locations(Location((-43, 80.5, 0), (0, 0, 180))):
            Circle(SKETCH_4_R_2, mode=Mode.SUBTRACT)
    # profile 5 of 6: a face of its own
    with BuildSketch(Plane.XY.offset(4).offset(CUT_EXTRUDE_START)):
        with Locations((57.5, 89.525)):
            Circle(SKETCH_4_R_3)
        with Locations(Location((57.5, 89.525, 0), (0, 0, 180))):
            Circle(SKETCH_4_R_4, mode=Mode.SUBTRACT)
    # profile 6 of 6: a face of its own
    with BuildSketch(Plane.XY.offset(4).offset(CUT_EXTRUDE_START)):
        with Locations((-57.5, 89.525)):
            Circle(SKETCH_4_R_3)
        with Locations(Location((-57.5, 89.525, 0), (0, 0, 180))):
            Circle(SKETCH_4_R_4, mode=Mode.SUBTRACT)
    extrude(amount=CUT_EXTRUDE_2_DEPTH, mode=Mode.SUBTRACT)


solid = part.part
